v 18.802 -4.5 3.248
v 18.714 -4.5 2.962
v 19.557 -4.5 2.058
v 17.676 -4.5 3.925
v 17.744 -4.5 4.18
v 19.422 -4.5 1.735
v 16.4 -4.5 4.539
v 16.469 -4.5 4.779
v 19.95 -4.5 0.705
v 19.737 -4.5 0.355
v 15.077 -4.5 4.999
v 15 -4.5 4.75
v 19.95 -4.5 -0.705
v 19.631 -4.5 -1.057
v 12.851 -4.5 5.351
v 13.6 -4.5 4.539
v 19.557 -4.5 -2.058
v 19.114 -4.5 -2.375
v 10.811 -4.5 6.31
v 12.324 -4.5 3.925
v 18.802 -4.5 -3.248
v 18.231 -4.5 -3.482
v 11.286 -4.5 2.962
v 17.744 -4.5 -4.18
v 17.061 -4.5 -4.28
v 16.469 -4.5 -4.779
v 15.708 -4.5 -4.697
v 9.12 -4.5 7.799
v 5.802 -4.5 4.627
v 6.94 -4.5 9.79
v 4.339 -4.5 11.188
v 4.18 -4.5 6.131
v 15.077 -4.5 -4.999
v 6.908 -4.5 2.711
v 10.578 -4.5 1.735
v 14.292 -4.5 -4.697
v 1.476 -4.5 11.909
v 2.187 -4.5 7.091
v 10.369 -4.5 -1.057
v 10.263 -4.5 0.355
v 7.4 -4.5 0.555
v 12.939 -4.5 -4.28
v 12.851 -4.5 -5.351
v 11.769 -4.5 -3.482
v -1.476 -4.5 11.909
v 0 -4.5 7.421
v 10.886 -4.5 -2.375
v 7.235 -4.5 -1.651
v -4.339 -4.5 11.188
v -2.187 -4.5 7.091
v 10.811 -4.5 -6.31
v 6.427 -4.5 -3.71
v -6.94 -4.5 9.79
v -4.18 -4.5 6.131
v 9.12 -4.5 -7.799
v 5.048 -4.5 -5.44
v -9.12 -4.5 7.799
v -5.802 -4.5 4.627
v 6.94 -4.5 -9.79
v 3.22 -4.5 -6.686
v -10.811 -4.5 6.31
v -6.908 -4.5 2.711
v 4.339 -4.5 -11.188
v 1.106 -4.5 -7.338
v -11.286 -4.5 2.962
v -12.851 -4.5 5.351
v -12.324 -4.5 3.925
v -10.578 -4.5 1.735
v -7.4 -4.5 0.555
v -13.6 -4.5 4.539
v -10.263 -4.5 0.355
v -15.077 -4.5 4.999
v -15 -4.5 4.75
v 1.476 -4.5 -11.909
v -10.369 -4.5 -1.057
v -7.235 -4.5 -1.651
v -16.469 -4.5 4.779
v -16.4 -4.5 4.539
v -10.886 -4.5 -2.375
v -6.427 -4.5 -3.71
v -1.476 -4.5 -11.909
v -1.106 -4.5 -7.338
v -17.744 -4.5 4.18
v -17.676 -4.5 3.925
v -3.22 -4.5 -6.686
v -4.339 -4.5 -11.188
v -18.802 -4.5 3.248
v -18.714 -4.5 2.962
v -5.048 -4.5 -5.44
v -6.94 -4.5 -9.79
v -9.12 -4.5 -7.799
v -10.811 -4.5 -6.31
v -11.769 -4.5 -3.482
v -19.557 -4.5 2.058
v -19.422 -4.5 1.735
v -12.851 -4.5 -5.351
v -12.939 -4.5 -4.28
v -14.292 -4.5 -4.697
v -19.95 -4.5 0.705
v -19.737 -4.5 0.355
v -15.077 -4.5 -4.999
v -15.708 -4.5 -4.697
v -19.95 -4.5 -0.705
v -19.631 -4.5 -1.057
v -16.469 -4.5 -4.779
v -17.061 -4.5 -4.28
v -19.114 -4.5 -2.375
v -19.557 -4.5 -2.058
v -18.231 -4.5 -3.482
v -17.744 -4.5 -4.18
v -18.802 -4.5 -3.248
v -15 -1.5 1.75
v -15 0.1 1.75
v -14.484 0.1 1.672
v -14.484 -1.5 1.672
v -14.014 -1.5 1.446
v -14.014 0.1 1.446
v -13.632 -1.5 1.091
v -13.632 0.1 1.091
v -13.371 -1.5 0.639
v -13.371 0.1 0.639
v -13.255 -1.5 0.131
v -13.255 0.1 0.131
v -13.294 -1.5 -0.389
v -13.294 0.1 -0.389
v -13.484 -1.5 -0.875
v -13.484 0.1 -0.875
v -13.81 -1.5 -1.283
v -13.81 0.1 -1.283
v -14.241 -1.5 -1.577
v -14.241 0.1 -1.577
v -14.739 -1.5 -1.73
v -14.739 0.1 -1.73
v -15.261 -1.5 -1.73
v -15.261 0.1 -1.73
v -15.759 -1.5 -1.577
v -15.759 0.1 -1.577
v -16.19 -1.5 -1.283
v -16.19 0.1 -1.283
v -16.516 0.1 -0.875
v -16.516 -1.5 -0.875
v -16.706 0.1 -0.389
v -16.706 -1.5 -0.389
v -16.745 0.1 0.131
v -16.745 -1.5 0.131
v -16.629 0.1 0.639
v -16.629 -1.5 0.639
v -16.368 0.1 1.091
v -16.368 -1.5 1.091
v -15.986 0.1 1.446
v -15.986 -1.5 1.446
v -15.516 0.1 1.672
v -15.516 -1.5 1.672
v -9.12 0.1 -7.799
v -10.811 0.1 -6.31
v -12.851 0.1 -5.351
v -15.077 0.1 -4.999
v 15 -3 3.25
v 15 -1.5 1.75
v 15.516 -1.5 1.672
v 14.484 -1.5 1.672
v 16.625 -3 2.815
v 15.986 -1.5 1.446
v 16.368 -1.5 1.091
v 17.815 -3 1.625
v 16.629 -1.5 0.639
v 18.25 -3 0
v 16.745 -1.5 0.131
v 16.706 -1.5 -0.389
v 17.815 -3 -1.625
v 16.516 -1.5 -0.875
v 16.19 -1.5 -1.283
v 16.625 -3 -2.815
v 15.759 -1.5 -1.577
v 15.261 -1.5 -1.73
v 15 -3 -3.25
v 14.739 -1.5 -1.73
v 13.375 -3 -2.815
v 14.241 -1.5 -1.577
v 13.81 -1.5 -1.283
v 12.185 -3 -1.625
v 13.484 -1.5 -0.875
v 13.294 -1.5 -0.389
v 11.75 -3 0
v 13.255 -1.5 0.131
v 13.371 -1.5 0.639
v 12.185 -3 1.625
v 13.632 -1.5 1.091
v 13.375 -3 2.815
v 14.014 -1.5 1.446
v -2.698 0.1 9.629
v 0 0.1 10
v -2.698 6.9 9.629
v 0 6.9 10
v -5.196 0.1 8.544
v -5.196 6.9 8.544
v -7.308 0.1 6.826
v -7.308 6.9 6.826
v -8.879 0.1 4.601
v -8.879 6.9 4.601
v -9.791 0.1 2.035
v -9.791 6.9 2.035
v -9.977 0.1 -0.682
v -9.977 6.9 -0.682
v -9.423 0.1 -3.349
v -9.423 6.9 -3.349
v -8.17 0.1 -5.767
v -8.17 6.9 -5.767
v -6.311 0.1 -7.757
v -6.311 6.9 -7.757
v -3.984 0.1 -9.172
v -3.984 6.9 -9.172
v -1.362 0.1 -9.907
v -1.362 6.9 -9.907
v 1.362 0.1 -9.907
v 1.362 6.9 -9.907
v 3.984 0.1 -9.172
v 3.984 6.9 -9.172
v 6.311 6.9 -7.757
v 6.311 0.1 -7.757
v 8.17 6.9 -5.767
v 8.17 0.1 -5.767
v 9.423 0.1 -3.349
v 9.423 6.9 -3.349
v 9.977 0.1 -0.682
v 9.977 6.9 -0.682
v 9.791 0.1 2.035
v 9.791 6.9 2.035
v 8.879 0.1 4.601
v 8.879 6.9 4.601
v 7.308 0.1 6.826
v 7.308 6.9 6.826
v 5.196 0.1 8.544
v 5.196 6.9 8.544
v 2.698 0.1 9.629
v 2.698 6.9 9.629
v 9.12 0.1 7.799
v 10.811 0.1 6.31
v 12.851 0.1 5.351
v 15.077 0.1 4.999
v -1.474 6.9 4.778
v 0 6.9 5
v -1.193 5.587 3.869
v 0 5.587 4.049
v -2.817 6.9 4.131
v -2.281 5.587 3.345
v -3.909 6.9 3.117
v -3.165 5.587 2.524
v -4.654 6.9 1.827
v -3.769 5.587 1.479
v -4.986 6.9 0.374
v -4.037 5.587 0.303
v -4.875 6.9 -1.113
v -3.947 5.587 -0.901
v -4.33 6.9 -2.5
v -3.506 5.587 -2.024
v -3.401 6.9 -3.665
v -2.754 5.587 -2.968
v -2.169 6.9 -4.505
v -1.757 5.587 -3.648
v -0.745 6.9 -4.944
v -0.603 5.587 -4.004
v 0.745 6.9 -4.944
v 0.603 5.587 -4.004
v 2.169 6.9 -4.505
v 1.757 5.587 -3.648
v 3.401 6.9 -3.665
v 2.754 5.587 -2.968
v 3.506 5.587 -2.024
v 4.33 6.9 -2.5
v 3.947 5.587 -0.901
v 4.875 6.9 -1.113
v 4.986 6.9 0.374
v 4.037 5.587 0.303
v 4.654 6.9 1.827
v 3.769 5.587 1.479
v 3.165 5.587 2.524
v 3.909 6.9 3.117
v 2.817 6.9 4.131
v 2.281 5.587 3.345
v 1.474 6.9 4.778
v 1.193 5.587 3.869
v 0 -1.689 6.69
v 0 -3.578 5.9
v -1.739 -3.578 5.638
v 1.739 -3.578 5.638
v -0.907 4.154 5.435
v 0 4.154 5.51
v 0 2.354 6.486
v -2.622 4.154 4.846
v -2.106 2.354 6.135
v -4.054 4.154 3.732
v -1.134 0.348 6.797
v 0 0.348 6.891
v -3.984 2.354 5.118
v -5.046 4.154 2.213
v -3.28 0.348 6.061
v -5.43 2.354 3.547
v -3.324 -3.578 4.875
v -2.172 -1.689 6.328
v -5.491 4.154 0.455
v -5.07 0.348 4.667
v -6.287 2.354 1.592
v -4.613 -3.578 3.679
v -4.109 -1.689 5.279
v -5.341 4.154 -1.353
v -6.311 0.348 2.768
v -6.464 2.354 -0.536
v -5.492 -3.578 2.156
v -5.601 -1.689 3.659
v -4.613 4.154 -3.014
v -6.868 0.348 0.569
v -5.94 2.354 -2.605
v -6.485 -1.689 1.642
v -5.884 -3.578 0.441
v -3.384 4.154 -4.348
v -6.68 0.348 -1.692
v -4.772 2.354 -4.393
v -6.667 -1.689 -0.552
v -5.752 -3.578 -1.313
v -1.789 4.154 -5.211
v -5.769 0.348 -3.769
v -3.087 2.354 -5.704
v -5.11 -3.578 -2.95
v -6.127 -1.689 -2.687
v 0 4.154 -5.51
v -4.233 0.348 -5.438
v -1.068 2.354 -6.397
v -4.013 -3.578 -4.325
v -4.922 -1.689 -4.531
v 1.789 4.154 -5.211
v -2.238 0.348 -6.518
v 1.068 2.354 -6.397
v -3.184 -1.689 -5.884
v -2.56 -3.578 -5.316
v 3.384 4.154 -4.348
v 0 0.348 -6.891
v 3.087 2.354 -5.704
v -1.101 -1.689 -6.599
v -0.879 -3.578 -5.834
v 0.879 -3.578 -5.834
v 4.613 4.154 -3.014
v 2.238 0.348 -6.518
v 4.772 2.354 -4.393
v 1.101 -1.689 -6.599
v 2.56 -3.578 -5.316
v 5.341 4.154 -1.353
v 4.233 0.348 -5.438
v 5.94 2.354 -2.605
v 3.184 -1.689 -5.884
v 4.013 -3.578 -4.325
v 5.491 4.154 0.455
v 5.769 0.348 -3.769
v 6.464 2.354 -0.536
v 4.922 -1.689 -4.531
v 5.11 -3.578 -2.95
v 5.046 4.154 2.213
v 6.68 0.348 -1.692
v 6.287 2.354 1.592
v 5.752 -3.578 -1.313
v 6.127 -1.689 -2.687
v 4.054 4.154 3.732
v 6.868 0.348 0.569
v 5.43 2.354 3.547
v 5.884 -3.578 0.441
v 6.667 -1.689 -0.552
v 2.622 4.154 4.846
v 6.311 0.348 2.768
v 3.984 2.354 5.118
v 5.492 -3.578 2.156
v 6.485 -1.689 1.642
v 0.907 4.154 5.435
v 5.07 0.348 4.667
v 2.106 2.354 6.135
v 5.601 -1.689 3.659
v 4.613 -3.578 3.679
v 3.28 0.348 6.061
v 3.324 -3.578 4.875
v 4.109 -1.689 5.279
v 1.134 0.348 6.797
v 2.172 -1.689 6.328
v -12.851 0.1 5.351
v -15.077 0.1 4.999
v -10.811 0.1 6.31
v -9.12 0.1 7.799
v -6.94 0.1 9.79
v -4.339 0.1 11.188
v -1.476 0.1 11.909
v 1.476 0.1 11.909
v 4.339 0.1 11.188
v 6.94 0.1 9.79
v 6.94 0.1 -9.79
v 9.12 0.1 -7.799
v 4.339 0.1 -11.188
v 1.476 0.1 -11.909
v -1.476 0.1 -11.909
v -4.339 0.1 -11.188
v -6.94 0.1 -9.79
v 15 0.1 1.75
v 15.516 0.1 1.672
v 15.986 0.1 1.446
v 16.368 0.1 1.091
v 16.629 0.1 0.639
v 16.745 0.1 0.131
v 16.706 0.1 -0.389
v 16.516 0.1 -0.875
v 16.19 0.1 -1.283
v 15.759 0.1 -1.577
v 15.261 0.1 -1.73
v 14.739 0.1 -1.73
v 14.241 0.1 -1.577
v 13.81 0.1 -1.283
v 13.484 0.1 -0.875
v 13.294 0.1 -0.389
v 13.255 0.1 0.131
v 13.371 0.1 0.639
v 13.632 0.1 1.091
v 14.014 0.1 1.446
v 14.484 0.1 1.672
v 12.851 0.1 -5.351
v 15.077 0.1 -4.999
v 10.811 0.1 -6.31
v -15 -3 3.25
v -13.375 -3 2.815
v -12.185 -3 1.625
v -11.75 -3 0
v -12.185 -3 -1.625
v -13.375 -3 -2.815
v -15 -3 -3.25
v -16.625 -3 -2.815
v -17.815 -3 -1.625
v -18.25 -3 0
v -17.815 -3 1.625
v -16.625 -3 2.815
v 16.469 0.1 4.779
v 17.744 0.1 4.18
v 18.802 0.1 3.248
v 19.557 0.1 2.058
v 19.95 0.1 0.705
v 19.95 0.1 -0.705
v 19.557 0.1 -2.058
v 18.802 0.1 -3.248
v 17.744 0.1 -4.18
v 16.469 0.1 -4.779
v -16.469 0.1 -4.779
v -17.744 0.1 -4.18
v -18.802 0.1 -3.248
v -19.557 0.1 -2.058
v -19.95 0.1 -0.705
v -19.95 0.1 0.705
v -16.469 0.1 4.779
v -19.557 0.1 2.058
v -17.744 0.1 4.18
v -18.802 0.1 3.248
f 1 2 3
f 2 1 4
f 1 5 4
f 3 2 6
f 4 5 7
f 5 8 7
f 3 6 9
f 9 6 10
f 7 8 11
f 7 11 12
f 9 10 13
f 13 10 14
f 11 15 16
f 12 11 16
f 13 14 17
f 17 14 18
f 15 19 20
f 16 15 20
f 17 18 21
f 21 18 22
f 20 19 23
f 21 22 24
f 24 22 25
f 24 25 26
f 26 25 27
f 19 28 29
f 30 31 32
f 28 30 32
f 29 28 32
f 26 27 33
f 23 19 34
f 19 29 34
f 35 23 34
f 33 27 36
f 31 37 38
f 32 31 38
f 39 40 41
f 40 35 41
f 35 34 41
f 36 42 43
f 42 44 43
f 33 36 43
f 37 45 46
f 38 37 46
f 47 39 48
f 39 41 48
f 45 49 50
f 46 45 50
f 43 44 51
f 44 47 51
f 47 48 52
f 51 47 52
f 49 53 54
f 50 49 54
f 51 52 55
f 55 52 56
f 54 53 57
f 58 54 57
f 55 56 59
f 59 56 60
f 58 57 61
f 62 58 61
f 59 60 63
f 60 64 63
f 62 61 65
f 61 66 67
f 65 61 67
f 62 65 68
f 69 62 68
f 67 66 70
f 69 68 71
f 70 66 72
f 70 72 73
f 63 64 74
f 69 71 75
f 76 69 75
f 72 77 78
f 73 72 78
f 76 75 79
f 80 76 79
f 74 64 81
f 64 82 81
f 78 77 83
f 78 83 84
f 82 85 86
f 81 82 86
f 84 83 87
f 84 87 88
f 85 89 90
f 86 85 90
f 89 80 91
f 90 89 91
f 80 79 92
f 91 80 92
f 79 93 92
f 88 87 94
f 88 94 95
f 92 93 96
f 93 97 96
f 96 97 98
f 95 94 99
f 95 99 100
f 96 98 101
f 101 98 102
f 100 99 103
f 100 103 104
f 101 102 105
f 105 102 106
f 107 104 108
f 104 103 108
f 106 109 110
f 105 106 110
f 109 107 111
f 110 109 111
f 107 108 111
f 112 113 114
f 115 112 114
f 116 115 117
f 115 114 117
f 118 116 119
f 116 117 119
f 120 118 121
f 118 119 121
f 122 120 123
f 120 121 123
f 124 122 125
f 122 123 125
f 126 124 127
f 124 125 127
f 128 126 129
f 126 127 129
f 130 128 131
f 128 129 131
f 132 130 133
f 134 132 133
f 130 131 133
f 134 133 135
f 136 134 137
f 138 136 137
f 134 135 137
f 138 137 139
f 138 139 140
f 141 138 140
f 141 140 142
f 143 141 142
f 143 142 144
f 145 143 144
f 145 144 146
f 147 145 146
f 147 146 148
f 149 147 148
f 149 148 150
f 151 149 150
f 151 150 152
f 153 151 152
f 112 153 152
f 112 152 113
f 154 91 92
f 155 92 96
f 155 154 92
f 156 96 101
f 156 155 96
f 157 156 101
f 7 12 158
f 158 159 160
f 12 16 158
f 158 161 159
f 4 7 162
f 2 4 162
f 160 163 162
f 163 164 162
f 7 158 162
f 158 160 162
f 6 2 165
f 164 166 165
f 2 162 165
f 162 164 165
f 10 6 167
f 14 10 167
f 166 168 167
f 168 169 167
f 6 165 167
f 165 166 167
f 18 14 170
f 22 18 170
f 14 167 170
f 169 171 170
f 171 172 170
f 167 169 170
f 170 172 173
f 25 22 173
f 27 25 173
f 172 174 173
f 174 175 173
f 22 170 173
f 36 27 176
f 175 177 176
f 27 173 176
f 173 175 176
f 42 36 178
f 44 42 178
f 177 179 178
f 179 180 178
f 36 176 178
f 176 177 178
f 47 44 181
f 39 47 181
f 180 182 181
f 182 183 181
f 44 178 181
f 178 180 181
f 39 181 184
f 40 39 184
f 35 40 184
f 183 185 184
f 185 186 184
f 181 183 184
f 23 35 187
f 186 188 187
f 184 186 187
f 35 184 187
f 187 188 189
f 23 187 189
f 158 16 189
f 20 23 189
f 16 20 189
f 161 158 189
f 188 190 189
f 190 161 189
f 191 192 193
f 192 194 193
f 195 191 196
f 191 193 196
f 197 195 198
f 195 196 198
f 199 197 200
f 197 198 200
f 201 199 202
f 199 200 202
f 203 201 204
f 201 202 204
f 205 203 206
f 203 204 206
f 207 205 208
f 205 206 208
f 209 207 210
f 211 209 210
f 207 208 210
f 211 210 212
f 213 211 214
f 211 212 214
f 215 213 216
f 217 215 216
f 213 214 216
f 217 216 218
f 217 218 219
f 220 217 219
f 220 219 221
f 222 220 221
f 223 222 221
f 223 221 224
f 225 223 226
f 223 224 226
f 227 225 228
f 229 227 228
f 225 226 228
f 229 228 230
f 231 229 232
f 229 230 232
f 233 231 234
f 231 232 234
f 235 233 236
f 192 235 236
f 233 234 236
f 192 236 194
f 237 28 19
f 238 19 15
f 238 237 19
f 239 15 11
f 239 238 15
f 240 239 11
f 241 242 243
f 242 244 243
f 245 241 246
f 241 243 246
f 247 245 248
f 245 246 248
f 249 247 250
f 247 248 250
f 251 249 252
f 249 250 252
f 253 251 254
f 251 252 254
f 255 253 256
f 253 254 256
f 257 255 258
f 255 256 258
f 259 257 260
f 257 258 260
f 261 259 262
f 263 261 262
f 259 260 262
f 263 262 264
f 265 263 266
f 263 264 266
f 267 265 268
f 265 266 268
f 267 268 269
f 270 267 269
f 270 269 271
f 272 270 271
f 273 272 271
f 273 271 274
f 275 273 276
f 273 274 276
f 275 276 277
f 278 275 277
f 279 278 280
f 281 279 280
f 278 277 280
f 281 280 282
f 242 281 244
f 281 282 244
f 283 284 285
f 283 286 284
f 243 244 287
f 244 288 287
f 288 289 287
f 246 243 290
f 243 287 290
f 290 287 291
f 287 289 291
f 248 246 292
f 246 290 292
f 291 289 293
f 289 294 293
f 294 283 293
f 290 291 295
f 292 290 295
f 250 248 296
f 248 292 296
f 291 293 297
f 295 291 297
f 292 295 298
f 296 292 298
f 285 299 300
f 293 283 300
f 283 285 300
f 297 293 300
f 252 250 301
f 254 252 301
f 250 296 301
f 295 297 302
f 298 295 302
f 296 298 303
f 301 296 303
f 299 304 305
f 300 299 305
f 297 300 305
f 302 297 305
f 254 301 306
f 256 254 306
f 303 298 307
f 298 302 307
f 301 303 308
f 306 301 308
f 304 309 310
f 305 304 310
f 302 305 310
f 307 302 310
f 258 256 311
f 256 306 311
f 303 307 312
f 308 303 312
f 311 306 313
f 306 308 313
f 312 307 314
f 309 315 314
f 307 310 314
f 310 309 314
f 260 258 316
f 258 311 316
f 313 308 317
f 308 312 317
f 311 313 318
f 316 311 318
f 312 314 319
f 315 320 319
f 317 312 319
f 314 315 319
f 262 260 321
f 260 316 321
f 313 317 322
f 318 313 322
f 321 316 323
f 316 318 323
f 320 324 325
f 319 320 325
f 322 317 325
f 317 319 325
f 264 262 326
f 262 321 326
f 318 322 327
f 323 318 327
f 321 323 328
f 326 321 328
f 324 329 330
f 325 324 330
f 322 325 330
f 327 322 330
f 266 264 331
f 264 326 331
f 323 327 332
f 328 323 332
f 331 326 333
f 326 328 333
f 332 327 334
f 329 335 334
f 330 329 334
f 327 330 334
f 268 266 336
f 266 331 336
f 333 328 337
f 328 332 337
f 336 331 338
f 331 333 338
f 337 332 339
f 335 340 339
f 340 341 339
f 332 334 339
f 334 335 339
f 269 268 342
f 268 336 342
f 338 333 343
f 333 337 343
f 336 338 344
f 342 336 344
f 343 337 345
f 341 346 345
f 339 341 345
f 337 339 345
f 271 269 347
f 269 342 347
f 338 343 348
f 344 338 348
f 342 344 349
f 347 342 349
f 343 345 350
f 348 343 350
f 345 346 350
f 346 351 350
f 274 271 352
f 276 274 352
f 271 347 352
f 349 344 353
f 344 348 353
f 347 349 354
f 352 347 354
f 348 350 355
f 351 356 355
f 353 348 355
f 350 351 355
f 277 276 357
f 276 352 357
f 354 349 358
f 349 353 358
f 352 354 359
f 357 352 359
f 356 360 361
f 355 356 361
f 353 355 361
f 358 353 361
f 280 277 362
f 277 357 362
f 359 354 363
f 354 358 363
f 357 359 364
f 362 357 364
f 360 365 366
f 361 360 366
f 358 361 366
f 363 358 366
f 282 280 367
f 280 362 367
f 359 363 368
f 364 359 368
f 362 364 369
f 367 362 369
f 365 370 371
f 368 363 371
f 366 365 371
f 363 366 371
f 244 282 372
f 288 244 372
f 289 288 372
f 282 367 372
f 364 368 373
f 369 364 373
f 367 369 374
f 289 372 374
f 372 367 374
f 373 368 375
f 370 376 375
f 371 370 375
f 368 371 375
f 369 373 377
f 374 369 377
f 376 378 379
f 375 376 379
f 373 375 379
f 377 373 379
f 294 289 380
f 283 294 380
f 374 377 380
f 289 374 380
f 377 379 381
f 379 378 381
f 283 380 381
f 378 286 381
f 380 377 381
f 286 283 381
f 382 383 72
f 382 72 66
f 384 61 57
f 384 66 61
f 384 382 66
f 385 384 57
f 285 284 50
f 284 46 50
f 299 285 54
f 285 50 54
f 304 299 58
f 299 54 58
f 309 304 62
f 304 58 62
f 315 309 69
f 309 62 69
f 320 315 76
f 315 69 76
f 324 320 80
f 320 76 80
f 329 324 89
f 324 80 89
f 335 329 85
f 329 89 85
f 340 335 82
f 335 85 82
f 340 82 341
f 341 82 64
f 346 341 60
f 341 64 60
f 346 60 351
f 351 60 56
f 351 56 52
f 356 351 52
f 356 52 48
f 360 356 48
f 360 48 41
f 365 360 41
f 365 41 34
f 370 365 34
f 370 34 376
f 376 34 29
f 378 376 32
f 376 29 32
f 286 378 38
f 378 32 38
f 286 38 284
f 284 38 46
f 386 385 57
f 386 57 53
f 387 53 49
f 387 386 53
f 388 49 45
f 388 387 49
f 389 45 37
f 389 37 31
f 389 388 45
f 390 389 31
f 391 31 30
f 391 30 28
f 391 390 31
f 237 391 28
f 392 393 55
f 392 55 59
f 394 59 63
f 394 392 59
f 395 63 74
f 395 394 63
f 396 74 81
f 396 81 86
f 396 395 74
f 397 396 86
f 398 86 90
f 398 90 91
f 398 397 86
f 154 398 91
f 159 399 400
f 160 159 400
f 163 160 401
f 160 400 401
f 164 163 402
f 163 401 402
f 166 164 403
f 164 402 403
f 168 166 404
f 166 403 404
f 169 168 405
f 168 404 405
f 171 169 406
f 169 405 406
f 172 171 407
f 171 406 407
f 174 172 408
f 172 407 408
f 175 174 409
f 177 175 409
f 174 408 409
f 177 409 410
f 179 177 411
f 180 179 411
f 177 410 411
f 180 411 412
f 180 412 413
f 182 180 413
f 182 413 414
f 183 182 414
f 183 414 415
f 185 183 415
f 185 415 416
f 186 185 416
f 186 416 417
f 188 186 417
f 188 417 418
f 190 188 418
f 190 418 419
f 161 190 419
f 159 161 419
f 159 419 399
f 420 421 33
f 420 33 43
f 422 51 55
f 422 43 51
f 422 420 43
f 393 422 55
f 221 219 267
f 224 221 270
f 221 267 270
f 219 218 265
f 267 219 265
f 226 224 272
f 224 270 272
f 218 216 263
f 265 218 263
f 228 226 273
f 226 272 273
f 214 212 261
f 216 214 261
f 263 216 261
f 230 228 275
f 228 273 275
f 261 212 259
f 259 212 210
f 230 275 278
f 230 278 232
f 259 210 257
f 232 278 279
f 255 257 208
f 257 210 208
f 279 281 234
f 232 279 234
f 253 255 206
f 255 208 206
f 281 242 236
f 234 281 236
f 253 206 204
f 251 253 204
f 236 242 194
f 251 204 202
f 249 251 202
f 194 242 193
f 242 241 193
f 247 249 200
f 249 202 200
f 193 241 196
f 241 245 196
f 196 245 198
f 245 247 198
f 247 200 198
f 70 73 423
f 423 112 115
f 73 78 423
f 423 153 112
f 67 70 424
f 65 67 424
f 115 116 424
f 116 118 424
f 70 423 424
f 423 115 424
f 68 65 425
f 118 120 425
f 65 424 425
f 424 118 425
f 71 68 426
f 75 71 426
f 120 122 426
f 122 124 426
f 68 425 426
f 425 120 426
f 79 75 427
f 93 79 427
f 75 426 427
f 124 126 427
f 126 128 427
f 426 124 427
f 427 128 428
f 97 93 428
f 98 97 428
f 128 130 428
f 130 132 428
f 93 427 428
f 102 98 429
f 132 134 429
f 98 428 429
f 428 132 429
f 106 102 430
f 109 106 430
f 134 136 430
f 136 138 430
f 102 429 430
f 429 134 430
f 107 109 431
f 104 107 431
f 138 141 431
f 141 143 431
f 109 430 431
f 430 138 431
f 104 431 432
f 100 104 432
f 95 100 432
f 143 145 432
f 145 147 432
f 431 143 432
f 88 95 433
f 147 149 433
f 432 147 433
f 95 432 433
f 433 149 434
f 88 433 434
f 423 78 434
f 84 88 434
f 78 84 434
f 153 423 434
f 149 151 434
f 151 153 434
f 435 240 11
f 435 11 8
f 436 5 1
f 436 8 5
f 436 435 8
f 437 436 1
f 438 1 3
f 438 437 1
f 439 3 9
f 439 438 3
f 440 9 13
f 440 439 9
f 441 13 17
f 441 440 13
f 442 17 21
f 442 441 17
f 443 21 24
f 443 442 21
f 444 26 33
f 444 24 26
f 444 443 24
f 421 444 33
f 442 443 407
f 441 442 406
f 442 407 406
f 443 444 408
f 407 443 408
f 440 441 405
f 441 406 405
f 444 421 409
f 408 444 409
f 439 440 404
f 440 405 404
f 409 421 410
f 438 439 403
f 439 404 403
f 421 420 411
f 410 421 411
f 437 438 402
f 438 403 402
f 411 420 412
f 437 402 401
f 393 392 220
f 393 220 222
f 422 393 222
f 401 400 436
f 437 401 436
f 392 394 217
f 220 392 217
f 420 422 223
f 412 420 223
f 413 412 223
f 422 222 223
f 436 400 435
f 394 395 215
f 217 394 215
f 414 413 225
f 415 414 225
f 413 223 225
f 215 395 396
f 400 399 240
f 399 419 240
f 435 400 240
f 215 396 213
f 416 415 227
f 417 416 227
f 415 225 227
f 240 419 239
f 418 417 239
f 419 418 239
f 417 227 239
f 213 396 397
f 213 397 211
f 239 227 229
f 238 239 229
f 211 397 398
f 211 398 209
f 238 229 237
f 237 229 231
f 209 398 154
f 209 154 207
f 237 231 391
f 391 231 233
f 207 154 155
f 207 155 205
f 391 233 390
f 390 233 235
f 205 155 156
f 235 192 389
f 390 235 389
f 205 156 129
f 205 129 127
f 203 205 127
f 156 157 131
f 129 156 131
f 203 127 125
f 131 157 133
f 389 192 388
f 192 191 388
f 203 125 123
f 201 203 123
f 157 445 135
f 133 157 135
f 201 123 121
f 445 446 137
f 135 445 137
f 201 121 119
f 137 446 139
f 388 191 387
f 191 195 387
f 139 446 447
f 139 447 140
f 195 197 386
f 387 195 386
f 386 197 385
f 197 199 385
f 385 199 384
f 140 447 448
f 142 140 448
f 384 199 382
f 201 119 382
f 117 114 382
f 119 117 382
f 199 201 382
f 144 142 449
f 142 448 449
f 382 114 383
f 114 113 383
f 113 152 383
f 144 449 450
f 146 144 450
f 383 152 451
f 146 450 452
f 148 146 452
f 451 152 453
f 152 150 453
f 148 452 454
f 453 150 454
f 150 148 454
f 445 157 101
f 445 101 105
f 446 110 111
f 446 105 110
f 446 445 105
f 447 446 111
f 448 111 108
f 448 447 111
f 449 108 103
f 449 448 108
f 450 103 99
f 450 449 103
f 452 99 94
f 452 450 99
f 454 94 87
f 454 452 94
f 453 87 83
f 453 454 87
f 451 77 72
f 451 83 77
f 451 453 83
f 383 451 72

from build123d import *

# Parameters (mm, degrees)
ESQUISSE2_R             = 1.75
ENL_V_MAT_EXTRU_1_DEPTH = 30.090204537
CHANFREIN1_SIZE         = 3
ESQUISSE4_OUTSIDE_W     = 53.542
ESQUISSE4_OUTSIDE_H     = 53.542
ENL_V_MAT_EXTRU_2_DEPTH = 30.090204537


with BuildPart() as part:
    # Esquisse1 → Révolution1 (revolve)
    with BuildSketch(Plane.XY, mode=Mode.PRIVATE) as r_volution1_sk:
        with BuildLine():
            Line((-5.9, -3.577708764), (-7.4209506, -4.5))
            Line((-7.4209506, -4.5), (-20, -4.5))
            Line((-20, -4.5), (-20, 0.1))
            Line((-20, 0.1), (-10, 0.1))
            Line((-10, 0.1), (-10, 6.9))
            Line((-10, 6.9), (-5, 6.9))
            Line((-5, 6.9), (-4.048749214, 5.587273915))
            ThreePointArc((-4.048749214, 5.587273915), (-6.7634037, 1.366151673), (-5.9, -3.577708764))
        make_face()
    revolve(r_volution1_sk.sketch.rotate(Axis((0, 18.9741444, 0), (0, -1, 0)), 270), axis=Axis((0, 18.9741444, 0), (0, -1, 0)))

    # Esquisse2 → Enlèv. mat.-Extru.1 (cut, through all)
    with BuildSketch(Plane(origin=(0, 0.1, 0), x_dir=(1, 0, 0), z_dir=(0, 1, 0))):
        with Locations(Location((-15, 0, 0), (0, 0, 270))):
            Circle(ESQUISSE2_R)
        with Locations(Location((15, 0, 0), (0, 0, 270))):
            Circle(ESQUISSE2_R)
    extrude(amount=-ENL_V_MAT_EXTRU_1_DEPTH, mode=Mode.SUBTRACT)

    # Chanfrein1
    chanfrein1_edges = [part.edges().sort_by_distance(p)[0] for p in [
        (-15, -4.5, -1.75),
        (15, -4.5, -1.75),
    ]]
    chamfer(chanfrein1_edges, length=CHANFREIN1_SIZE)

    # Esquisse4 outside → Enlèv. mat.-Extru.2 (cut, through all)
    with BuildSketch(Plane(origin=(0, 0.1, 0), x_dir=(1, 0, 0), z_dir=(0, 1, 0))):
        Rectangle(ESQUISSE4_OUTSIDE_W, ESQUISSE4_OUTSIDE_H)
        with BuildLine():
            ThreePointArc((-9.12, -7.799076868), (0, -12), (9.12, -7.799076868))
            ThreePointArc((9.12, -7.799076868), (11.797195727, -5.758231957), (15.076923077, -4.999408249))
            ThreePointArc((15.076923077, -4.999408249), (20, 0), (15.076923077, 4.999408249))
            ThreePointArc((15.076923077, 4.999408249), (11.797195727, 5.758231957), (9.12, 7.799076868))
            ThreePointArc((9.12, 7.799076868), (0, 12), (-9.12, 7.799076868))
            ThreePointArc((-9.12, 7.799076868), (-11.797195727, 5.758231957), (-15.076923077, 4.999408249))
            ThreePointArc((-15.076923077, 4.999408249), (-20, 0), (-15.076923077, -4.999408249))
            ThreePointArc((-15.076923077, -4.999408249), (-11.797195727, -5.758231957), (-9.12, -7.799076868))
        make_face(mode=Mode.SUBTRACT)
    extrude(amount=-ENL_V_MAT_EXTRU_2_DEPTH, mode=Mode.SUBTRACT)


solid = part.part
